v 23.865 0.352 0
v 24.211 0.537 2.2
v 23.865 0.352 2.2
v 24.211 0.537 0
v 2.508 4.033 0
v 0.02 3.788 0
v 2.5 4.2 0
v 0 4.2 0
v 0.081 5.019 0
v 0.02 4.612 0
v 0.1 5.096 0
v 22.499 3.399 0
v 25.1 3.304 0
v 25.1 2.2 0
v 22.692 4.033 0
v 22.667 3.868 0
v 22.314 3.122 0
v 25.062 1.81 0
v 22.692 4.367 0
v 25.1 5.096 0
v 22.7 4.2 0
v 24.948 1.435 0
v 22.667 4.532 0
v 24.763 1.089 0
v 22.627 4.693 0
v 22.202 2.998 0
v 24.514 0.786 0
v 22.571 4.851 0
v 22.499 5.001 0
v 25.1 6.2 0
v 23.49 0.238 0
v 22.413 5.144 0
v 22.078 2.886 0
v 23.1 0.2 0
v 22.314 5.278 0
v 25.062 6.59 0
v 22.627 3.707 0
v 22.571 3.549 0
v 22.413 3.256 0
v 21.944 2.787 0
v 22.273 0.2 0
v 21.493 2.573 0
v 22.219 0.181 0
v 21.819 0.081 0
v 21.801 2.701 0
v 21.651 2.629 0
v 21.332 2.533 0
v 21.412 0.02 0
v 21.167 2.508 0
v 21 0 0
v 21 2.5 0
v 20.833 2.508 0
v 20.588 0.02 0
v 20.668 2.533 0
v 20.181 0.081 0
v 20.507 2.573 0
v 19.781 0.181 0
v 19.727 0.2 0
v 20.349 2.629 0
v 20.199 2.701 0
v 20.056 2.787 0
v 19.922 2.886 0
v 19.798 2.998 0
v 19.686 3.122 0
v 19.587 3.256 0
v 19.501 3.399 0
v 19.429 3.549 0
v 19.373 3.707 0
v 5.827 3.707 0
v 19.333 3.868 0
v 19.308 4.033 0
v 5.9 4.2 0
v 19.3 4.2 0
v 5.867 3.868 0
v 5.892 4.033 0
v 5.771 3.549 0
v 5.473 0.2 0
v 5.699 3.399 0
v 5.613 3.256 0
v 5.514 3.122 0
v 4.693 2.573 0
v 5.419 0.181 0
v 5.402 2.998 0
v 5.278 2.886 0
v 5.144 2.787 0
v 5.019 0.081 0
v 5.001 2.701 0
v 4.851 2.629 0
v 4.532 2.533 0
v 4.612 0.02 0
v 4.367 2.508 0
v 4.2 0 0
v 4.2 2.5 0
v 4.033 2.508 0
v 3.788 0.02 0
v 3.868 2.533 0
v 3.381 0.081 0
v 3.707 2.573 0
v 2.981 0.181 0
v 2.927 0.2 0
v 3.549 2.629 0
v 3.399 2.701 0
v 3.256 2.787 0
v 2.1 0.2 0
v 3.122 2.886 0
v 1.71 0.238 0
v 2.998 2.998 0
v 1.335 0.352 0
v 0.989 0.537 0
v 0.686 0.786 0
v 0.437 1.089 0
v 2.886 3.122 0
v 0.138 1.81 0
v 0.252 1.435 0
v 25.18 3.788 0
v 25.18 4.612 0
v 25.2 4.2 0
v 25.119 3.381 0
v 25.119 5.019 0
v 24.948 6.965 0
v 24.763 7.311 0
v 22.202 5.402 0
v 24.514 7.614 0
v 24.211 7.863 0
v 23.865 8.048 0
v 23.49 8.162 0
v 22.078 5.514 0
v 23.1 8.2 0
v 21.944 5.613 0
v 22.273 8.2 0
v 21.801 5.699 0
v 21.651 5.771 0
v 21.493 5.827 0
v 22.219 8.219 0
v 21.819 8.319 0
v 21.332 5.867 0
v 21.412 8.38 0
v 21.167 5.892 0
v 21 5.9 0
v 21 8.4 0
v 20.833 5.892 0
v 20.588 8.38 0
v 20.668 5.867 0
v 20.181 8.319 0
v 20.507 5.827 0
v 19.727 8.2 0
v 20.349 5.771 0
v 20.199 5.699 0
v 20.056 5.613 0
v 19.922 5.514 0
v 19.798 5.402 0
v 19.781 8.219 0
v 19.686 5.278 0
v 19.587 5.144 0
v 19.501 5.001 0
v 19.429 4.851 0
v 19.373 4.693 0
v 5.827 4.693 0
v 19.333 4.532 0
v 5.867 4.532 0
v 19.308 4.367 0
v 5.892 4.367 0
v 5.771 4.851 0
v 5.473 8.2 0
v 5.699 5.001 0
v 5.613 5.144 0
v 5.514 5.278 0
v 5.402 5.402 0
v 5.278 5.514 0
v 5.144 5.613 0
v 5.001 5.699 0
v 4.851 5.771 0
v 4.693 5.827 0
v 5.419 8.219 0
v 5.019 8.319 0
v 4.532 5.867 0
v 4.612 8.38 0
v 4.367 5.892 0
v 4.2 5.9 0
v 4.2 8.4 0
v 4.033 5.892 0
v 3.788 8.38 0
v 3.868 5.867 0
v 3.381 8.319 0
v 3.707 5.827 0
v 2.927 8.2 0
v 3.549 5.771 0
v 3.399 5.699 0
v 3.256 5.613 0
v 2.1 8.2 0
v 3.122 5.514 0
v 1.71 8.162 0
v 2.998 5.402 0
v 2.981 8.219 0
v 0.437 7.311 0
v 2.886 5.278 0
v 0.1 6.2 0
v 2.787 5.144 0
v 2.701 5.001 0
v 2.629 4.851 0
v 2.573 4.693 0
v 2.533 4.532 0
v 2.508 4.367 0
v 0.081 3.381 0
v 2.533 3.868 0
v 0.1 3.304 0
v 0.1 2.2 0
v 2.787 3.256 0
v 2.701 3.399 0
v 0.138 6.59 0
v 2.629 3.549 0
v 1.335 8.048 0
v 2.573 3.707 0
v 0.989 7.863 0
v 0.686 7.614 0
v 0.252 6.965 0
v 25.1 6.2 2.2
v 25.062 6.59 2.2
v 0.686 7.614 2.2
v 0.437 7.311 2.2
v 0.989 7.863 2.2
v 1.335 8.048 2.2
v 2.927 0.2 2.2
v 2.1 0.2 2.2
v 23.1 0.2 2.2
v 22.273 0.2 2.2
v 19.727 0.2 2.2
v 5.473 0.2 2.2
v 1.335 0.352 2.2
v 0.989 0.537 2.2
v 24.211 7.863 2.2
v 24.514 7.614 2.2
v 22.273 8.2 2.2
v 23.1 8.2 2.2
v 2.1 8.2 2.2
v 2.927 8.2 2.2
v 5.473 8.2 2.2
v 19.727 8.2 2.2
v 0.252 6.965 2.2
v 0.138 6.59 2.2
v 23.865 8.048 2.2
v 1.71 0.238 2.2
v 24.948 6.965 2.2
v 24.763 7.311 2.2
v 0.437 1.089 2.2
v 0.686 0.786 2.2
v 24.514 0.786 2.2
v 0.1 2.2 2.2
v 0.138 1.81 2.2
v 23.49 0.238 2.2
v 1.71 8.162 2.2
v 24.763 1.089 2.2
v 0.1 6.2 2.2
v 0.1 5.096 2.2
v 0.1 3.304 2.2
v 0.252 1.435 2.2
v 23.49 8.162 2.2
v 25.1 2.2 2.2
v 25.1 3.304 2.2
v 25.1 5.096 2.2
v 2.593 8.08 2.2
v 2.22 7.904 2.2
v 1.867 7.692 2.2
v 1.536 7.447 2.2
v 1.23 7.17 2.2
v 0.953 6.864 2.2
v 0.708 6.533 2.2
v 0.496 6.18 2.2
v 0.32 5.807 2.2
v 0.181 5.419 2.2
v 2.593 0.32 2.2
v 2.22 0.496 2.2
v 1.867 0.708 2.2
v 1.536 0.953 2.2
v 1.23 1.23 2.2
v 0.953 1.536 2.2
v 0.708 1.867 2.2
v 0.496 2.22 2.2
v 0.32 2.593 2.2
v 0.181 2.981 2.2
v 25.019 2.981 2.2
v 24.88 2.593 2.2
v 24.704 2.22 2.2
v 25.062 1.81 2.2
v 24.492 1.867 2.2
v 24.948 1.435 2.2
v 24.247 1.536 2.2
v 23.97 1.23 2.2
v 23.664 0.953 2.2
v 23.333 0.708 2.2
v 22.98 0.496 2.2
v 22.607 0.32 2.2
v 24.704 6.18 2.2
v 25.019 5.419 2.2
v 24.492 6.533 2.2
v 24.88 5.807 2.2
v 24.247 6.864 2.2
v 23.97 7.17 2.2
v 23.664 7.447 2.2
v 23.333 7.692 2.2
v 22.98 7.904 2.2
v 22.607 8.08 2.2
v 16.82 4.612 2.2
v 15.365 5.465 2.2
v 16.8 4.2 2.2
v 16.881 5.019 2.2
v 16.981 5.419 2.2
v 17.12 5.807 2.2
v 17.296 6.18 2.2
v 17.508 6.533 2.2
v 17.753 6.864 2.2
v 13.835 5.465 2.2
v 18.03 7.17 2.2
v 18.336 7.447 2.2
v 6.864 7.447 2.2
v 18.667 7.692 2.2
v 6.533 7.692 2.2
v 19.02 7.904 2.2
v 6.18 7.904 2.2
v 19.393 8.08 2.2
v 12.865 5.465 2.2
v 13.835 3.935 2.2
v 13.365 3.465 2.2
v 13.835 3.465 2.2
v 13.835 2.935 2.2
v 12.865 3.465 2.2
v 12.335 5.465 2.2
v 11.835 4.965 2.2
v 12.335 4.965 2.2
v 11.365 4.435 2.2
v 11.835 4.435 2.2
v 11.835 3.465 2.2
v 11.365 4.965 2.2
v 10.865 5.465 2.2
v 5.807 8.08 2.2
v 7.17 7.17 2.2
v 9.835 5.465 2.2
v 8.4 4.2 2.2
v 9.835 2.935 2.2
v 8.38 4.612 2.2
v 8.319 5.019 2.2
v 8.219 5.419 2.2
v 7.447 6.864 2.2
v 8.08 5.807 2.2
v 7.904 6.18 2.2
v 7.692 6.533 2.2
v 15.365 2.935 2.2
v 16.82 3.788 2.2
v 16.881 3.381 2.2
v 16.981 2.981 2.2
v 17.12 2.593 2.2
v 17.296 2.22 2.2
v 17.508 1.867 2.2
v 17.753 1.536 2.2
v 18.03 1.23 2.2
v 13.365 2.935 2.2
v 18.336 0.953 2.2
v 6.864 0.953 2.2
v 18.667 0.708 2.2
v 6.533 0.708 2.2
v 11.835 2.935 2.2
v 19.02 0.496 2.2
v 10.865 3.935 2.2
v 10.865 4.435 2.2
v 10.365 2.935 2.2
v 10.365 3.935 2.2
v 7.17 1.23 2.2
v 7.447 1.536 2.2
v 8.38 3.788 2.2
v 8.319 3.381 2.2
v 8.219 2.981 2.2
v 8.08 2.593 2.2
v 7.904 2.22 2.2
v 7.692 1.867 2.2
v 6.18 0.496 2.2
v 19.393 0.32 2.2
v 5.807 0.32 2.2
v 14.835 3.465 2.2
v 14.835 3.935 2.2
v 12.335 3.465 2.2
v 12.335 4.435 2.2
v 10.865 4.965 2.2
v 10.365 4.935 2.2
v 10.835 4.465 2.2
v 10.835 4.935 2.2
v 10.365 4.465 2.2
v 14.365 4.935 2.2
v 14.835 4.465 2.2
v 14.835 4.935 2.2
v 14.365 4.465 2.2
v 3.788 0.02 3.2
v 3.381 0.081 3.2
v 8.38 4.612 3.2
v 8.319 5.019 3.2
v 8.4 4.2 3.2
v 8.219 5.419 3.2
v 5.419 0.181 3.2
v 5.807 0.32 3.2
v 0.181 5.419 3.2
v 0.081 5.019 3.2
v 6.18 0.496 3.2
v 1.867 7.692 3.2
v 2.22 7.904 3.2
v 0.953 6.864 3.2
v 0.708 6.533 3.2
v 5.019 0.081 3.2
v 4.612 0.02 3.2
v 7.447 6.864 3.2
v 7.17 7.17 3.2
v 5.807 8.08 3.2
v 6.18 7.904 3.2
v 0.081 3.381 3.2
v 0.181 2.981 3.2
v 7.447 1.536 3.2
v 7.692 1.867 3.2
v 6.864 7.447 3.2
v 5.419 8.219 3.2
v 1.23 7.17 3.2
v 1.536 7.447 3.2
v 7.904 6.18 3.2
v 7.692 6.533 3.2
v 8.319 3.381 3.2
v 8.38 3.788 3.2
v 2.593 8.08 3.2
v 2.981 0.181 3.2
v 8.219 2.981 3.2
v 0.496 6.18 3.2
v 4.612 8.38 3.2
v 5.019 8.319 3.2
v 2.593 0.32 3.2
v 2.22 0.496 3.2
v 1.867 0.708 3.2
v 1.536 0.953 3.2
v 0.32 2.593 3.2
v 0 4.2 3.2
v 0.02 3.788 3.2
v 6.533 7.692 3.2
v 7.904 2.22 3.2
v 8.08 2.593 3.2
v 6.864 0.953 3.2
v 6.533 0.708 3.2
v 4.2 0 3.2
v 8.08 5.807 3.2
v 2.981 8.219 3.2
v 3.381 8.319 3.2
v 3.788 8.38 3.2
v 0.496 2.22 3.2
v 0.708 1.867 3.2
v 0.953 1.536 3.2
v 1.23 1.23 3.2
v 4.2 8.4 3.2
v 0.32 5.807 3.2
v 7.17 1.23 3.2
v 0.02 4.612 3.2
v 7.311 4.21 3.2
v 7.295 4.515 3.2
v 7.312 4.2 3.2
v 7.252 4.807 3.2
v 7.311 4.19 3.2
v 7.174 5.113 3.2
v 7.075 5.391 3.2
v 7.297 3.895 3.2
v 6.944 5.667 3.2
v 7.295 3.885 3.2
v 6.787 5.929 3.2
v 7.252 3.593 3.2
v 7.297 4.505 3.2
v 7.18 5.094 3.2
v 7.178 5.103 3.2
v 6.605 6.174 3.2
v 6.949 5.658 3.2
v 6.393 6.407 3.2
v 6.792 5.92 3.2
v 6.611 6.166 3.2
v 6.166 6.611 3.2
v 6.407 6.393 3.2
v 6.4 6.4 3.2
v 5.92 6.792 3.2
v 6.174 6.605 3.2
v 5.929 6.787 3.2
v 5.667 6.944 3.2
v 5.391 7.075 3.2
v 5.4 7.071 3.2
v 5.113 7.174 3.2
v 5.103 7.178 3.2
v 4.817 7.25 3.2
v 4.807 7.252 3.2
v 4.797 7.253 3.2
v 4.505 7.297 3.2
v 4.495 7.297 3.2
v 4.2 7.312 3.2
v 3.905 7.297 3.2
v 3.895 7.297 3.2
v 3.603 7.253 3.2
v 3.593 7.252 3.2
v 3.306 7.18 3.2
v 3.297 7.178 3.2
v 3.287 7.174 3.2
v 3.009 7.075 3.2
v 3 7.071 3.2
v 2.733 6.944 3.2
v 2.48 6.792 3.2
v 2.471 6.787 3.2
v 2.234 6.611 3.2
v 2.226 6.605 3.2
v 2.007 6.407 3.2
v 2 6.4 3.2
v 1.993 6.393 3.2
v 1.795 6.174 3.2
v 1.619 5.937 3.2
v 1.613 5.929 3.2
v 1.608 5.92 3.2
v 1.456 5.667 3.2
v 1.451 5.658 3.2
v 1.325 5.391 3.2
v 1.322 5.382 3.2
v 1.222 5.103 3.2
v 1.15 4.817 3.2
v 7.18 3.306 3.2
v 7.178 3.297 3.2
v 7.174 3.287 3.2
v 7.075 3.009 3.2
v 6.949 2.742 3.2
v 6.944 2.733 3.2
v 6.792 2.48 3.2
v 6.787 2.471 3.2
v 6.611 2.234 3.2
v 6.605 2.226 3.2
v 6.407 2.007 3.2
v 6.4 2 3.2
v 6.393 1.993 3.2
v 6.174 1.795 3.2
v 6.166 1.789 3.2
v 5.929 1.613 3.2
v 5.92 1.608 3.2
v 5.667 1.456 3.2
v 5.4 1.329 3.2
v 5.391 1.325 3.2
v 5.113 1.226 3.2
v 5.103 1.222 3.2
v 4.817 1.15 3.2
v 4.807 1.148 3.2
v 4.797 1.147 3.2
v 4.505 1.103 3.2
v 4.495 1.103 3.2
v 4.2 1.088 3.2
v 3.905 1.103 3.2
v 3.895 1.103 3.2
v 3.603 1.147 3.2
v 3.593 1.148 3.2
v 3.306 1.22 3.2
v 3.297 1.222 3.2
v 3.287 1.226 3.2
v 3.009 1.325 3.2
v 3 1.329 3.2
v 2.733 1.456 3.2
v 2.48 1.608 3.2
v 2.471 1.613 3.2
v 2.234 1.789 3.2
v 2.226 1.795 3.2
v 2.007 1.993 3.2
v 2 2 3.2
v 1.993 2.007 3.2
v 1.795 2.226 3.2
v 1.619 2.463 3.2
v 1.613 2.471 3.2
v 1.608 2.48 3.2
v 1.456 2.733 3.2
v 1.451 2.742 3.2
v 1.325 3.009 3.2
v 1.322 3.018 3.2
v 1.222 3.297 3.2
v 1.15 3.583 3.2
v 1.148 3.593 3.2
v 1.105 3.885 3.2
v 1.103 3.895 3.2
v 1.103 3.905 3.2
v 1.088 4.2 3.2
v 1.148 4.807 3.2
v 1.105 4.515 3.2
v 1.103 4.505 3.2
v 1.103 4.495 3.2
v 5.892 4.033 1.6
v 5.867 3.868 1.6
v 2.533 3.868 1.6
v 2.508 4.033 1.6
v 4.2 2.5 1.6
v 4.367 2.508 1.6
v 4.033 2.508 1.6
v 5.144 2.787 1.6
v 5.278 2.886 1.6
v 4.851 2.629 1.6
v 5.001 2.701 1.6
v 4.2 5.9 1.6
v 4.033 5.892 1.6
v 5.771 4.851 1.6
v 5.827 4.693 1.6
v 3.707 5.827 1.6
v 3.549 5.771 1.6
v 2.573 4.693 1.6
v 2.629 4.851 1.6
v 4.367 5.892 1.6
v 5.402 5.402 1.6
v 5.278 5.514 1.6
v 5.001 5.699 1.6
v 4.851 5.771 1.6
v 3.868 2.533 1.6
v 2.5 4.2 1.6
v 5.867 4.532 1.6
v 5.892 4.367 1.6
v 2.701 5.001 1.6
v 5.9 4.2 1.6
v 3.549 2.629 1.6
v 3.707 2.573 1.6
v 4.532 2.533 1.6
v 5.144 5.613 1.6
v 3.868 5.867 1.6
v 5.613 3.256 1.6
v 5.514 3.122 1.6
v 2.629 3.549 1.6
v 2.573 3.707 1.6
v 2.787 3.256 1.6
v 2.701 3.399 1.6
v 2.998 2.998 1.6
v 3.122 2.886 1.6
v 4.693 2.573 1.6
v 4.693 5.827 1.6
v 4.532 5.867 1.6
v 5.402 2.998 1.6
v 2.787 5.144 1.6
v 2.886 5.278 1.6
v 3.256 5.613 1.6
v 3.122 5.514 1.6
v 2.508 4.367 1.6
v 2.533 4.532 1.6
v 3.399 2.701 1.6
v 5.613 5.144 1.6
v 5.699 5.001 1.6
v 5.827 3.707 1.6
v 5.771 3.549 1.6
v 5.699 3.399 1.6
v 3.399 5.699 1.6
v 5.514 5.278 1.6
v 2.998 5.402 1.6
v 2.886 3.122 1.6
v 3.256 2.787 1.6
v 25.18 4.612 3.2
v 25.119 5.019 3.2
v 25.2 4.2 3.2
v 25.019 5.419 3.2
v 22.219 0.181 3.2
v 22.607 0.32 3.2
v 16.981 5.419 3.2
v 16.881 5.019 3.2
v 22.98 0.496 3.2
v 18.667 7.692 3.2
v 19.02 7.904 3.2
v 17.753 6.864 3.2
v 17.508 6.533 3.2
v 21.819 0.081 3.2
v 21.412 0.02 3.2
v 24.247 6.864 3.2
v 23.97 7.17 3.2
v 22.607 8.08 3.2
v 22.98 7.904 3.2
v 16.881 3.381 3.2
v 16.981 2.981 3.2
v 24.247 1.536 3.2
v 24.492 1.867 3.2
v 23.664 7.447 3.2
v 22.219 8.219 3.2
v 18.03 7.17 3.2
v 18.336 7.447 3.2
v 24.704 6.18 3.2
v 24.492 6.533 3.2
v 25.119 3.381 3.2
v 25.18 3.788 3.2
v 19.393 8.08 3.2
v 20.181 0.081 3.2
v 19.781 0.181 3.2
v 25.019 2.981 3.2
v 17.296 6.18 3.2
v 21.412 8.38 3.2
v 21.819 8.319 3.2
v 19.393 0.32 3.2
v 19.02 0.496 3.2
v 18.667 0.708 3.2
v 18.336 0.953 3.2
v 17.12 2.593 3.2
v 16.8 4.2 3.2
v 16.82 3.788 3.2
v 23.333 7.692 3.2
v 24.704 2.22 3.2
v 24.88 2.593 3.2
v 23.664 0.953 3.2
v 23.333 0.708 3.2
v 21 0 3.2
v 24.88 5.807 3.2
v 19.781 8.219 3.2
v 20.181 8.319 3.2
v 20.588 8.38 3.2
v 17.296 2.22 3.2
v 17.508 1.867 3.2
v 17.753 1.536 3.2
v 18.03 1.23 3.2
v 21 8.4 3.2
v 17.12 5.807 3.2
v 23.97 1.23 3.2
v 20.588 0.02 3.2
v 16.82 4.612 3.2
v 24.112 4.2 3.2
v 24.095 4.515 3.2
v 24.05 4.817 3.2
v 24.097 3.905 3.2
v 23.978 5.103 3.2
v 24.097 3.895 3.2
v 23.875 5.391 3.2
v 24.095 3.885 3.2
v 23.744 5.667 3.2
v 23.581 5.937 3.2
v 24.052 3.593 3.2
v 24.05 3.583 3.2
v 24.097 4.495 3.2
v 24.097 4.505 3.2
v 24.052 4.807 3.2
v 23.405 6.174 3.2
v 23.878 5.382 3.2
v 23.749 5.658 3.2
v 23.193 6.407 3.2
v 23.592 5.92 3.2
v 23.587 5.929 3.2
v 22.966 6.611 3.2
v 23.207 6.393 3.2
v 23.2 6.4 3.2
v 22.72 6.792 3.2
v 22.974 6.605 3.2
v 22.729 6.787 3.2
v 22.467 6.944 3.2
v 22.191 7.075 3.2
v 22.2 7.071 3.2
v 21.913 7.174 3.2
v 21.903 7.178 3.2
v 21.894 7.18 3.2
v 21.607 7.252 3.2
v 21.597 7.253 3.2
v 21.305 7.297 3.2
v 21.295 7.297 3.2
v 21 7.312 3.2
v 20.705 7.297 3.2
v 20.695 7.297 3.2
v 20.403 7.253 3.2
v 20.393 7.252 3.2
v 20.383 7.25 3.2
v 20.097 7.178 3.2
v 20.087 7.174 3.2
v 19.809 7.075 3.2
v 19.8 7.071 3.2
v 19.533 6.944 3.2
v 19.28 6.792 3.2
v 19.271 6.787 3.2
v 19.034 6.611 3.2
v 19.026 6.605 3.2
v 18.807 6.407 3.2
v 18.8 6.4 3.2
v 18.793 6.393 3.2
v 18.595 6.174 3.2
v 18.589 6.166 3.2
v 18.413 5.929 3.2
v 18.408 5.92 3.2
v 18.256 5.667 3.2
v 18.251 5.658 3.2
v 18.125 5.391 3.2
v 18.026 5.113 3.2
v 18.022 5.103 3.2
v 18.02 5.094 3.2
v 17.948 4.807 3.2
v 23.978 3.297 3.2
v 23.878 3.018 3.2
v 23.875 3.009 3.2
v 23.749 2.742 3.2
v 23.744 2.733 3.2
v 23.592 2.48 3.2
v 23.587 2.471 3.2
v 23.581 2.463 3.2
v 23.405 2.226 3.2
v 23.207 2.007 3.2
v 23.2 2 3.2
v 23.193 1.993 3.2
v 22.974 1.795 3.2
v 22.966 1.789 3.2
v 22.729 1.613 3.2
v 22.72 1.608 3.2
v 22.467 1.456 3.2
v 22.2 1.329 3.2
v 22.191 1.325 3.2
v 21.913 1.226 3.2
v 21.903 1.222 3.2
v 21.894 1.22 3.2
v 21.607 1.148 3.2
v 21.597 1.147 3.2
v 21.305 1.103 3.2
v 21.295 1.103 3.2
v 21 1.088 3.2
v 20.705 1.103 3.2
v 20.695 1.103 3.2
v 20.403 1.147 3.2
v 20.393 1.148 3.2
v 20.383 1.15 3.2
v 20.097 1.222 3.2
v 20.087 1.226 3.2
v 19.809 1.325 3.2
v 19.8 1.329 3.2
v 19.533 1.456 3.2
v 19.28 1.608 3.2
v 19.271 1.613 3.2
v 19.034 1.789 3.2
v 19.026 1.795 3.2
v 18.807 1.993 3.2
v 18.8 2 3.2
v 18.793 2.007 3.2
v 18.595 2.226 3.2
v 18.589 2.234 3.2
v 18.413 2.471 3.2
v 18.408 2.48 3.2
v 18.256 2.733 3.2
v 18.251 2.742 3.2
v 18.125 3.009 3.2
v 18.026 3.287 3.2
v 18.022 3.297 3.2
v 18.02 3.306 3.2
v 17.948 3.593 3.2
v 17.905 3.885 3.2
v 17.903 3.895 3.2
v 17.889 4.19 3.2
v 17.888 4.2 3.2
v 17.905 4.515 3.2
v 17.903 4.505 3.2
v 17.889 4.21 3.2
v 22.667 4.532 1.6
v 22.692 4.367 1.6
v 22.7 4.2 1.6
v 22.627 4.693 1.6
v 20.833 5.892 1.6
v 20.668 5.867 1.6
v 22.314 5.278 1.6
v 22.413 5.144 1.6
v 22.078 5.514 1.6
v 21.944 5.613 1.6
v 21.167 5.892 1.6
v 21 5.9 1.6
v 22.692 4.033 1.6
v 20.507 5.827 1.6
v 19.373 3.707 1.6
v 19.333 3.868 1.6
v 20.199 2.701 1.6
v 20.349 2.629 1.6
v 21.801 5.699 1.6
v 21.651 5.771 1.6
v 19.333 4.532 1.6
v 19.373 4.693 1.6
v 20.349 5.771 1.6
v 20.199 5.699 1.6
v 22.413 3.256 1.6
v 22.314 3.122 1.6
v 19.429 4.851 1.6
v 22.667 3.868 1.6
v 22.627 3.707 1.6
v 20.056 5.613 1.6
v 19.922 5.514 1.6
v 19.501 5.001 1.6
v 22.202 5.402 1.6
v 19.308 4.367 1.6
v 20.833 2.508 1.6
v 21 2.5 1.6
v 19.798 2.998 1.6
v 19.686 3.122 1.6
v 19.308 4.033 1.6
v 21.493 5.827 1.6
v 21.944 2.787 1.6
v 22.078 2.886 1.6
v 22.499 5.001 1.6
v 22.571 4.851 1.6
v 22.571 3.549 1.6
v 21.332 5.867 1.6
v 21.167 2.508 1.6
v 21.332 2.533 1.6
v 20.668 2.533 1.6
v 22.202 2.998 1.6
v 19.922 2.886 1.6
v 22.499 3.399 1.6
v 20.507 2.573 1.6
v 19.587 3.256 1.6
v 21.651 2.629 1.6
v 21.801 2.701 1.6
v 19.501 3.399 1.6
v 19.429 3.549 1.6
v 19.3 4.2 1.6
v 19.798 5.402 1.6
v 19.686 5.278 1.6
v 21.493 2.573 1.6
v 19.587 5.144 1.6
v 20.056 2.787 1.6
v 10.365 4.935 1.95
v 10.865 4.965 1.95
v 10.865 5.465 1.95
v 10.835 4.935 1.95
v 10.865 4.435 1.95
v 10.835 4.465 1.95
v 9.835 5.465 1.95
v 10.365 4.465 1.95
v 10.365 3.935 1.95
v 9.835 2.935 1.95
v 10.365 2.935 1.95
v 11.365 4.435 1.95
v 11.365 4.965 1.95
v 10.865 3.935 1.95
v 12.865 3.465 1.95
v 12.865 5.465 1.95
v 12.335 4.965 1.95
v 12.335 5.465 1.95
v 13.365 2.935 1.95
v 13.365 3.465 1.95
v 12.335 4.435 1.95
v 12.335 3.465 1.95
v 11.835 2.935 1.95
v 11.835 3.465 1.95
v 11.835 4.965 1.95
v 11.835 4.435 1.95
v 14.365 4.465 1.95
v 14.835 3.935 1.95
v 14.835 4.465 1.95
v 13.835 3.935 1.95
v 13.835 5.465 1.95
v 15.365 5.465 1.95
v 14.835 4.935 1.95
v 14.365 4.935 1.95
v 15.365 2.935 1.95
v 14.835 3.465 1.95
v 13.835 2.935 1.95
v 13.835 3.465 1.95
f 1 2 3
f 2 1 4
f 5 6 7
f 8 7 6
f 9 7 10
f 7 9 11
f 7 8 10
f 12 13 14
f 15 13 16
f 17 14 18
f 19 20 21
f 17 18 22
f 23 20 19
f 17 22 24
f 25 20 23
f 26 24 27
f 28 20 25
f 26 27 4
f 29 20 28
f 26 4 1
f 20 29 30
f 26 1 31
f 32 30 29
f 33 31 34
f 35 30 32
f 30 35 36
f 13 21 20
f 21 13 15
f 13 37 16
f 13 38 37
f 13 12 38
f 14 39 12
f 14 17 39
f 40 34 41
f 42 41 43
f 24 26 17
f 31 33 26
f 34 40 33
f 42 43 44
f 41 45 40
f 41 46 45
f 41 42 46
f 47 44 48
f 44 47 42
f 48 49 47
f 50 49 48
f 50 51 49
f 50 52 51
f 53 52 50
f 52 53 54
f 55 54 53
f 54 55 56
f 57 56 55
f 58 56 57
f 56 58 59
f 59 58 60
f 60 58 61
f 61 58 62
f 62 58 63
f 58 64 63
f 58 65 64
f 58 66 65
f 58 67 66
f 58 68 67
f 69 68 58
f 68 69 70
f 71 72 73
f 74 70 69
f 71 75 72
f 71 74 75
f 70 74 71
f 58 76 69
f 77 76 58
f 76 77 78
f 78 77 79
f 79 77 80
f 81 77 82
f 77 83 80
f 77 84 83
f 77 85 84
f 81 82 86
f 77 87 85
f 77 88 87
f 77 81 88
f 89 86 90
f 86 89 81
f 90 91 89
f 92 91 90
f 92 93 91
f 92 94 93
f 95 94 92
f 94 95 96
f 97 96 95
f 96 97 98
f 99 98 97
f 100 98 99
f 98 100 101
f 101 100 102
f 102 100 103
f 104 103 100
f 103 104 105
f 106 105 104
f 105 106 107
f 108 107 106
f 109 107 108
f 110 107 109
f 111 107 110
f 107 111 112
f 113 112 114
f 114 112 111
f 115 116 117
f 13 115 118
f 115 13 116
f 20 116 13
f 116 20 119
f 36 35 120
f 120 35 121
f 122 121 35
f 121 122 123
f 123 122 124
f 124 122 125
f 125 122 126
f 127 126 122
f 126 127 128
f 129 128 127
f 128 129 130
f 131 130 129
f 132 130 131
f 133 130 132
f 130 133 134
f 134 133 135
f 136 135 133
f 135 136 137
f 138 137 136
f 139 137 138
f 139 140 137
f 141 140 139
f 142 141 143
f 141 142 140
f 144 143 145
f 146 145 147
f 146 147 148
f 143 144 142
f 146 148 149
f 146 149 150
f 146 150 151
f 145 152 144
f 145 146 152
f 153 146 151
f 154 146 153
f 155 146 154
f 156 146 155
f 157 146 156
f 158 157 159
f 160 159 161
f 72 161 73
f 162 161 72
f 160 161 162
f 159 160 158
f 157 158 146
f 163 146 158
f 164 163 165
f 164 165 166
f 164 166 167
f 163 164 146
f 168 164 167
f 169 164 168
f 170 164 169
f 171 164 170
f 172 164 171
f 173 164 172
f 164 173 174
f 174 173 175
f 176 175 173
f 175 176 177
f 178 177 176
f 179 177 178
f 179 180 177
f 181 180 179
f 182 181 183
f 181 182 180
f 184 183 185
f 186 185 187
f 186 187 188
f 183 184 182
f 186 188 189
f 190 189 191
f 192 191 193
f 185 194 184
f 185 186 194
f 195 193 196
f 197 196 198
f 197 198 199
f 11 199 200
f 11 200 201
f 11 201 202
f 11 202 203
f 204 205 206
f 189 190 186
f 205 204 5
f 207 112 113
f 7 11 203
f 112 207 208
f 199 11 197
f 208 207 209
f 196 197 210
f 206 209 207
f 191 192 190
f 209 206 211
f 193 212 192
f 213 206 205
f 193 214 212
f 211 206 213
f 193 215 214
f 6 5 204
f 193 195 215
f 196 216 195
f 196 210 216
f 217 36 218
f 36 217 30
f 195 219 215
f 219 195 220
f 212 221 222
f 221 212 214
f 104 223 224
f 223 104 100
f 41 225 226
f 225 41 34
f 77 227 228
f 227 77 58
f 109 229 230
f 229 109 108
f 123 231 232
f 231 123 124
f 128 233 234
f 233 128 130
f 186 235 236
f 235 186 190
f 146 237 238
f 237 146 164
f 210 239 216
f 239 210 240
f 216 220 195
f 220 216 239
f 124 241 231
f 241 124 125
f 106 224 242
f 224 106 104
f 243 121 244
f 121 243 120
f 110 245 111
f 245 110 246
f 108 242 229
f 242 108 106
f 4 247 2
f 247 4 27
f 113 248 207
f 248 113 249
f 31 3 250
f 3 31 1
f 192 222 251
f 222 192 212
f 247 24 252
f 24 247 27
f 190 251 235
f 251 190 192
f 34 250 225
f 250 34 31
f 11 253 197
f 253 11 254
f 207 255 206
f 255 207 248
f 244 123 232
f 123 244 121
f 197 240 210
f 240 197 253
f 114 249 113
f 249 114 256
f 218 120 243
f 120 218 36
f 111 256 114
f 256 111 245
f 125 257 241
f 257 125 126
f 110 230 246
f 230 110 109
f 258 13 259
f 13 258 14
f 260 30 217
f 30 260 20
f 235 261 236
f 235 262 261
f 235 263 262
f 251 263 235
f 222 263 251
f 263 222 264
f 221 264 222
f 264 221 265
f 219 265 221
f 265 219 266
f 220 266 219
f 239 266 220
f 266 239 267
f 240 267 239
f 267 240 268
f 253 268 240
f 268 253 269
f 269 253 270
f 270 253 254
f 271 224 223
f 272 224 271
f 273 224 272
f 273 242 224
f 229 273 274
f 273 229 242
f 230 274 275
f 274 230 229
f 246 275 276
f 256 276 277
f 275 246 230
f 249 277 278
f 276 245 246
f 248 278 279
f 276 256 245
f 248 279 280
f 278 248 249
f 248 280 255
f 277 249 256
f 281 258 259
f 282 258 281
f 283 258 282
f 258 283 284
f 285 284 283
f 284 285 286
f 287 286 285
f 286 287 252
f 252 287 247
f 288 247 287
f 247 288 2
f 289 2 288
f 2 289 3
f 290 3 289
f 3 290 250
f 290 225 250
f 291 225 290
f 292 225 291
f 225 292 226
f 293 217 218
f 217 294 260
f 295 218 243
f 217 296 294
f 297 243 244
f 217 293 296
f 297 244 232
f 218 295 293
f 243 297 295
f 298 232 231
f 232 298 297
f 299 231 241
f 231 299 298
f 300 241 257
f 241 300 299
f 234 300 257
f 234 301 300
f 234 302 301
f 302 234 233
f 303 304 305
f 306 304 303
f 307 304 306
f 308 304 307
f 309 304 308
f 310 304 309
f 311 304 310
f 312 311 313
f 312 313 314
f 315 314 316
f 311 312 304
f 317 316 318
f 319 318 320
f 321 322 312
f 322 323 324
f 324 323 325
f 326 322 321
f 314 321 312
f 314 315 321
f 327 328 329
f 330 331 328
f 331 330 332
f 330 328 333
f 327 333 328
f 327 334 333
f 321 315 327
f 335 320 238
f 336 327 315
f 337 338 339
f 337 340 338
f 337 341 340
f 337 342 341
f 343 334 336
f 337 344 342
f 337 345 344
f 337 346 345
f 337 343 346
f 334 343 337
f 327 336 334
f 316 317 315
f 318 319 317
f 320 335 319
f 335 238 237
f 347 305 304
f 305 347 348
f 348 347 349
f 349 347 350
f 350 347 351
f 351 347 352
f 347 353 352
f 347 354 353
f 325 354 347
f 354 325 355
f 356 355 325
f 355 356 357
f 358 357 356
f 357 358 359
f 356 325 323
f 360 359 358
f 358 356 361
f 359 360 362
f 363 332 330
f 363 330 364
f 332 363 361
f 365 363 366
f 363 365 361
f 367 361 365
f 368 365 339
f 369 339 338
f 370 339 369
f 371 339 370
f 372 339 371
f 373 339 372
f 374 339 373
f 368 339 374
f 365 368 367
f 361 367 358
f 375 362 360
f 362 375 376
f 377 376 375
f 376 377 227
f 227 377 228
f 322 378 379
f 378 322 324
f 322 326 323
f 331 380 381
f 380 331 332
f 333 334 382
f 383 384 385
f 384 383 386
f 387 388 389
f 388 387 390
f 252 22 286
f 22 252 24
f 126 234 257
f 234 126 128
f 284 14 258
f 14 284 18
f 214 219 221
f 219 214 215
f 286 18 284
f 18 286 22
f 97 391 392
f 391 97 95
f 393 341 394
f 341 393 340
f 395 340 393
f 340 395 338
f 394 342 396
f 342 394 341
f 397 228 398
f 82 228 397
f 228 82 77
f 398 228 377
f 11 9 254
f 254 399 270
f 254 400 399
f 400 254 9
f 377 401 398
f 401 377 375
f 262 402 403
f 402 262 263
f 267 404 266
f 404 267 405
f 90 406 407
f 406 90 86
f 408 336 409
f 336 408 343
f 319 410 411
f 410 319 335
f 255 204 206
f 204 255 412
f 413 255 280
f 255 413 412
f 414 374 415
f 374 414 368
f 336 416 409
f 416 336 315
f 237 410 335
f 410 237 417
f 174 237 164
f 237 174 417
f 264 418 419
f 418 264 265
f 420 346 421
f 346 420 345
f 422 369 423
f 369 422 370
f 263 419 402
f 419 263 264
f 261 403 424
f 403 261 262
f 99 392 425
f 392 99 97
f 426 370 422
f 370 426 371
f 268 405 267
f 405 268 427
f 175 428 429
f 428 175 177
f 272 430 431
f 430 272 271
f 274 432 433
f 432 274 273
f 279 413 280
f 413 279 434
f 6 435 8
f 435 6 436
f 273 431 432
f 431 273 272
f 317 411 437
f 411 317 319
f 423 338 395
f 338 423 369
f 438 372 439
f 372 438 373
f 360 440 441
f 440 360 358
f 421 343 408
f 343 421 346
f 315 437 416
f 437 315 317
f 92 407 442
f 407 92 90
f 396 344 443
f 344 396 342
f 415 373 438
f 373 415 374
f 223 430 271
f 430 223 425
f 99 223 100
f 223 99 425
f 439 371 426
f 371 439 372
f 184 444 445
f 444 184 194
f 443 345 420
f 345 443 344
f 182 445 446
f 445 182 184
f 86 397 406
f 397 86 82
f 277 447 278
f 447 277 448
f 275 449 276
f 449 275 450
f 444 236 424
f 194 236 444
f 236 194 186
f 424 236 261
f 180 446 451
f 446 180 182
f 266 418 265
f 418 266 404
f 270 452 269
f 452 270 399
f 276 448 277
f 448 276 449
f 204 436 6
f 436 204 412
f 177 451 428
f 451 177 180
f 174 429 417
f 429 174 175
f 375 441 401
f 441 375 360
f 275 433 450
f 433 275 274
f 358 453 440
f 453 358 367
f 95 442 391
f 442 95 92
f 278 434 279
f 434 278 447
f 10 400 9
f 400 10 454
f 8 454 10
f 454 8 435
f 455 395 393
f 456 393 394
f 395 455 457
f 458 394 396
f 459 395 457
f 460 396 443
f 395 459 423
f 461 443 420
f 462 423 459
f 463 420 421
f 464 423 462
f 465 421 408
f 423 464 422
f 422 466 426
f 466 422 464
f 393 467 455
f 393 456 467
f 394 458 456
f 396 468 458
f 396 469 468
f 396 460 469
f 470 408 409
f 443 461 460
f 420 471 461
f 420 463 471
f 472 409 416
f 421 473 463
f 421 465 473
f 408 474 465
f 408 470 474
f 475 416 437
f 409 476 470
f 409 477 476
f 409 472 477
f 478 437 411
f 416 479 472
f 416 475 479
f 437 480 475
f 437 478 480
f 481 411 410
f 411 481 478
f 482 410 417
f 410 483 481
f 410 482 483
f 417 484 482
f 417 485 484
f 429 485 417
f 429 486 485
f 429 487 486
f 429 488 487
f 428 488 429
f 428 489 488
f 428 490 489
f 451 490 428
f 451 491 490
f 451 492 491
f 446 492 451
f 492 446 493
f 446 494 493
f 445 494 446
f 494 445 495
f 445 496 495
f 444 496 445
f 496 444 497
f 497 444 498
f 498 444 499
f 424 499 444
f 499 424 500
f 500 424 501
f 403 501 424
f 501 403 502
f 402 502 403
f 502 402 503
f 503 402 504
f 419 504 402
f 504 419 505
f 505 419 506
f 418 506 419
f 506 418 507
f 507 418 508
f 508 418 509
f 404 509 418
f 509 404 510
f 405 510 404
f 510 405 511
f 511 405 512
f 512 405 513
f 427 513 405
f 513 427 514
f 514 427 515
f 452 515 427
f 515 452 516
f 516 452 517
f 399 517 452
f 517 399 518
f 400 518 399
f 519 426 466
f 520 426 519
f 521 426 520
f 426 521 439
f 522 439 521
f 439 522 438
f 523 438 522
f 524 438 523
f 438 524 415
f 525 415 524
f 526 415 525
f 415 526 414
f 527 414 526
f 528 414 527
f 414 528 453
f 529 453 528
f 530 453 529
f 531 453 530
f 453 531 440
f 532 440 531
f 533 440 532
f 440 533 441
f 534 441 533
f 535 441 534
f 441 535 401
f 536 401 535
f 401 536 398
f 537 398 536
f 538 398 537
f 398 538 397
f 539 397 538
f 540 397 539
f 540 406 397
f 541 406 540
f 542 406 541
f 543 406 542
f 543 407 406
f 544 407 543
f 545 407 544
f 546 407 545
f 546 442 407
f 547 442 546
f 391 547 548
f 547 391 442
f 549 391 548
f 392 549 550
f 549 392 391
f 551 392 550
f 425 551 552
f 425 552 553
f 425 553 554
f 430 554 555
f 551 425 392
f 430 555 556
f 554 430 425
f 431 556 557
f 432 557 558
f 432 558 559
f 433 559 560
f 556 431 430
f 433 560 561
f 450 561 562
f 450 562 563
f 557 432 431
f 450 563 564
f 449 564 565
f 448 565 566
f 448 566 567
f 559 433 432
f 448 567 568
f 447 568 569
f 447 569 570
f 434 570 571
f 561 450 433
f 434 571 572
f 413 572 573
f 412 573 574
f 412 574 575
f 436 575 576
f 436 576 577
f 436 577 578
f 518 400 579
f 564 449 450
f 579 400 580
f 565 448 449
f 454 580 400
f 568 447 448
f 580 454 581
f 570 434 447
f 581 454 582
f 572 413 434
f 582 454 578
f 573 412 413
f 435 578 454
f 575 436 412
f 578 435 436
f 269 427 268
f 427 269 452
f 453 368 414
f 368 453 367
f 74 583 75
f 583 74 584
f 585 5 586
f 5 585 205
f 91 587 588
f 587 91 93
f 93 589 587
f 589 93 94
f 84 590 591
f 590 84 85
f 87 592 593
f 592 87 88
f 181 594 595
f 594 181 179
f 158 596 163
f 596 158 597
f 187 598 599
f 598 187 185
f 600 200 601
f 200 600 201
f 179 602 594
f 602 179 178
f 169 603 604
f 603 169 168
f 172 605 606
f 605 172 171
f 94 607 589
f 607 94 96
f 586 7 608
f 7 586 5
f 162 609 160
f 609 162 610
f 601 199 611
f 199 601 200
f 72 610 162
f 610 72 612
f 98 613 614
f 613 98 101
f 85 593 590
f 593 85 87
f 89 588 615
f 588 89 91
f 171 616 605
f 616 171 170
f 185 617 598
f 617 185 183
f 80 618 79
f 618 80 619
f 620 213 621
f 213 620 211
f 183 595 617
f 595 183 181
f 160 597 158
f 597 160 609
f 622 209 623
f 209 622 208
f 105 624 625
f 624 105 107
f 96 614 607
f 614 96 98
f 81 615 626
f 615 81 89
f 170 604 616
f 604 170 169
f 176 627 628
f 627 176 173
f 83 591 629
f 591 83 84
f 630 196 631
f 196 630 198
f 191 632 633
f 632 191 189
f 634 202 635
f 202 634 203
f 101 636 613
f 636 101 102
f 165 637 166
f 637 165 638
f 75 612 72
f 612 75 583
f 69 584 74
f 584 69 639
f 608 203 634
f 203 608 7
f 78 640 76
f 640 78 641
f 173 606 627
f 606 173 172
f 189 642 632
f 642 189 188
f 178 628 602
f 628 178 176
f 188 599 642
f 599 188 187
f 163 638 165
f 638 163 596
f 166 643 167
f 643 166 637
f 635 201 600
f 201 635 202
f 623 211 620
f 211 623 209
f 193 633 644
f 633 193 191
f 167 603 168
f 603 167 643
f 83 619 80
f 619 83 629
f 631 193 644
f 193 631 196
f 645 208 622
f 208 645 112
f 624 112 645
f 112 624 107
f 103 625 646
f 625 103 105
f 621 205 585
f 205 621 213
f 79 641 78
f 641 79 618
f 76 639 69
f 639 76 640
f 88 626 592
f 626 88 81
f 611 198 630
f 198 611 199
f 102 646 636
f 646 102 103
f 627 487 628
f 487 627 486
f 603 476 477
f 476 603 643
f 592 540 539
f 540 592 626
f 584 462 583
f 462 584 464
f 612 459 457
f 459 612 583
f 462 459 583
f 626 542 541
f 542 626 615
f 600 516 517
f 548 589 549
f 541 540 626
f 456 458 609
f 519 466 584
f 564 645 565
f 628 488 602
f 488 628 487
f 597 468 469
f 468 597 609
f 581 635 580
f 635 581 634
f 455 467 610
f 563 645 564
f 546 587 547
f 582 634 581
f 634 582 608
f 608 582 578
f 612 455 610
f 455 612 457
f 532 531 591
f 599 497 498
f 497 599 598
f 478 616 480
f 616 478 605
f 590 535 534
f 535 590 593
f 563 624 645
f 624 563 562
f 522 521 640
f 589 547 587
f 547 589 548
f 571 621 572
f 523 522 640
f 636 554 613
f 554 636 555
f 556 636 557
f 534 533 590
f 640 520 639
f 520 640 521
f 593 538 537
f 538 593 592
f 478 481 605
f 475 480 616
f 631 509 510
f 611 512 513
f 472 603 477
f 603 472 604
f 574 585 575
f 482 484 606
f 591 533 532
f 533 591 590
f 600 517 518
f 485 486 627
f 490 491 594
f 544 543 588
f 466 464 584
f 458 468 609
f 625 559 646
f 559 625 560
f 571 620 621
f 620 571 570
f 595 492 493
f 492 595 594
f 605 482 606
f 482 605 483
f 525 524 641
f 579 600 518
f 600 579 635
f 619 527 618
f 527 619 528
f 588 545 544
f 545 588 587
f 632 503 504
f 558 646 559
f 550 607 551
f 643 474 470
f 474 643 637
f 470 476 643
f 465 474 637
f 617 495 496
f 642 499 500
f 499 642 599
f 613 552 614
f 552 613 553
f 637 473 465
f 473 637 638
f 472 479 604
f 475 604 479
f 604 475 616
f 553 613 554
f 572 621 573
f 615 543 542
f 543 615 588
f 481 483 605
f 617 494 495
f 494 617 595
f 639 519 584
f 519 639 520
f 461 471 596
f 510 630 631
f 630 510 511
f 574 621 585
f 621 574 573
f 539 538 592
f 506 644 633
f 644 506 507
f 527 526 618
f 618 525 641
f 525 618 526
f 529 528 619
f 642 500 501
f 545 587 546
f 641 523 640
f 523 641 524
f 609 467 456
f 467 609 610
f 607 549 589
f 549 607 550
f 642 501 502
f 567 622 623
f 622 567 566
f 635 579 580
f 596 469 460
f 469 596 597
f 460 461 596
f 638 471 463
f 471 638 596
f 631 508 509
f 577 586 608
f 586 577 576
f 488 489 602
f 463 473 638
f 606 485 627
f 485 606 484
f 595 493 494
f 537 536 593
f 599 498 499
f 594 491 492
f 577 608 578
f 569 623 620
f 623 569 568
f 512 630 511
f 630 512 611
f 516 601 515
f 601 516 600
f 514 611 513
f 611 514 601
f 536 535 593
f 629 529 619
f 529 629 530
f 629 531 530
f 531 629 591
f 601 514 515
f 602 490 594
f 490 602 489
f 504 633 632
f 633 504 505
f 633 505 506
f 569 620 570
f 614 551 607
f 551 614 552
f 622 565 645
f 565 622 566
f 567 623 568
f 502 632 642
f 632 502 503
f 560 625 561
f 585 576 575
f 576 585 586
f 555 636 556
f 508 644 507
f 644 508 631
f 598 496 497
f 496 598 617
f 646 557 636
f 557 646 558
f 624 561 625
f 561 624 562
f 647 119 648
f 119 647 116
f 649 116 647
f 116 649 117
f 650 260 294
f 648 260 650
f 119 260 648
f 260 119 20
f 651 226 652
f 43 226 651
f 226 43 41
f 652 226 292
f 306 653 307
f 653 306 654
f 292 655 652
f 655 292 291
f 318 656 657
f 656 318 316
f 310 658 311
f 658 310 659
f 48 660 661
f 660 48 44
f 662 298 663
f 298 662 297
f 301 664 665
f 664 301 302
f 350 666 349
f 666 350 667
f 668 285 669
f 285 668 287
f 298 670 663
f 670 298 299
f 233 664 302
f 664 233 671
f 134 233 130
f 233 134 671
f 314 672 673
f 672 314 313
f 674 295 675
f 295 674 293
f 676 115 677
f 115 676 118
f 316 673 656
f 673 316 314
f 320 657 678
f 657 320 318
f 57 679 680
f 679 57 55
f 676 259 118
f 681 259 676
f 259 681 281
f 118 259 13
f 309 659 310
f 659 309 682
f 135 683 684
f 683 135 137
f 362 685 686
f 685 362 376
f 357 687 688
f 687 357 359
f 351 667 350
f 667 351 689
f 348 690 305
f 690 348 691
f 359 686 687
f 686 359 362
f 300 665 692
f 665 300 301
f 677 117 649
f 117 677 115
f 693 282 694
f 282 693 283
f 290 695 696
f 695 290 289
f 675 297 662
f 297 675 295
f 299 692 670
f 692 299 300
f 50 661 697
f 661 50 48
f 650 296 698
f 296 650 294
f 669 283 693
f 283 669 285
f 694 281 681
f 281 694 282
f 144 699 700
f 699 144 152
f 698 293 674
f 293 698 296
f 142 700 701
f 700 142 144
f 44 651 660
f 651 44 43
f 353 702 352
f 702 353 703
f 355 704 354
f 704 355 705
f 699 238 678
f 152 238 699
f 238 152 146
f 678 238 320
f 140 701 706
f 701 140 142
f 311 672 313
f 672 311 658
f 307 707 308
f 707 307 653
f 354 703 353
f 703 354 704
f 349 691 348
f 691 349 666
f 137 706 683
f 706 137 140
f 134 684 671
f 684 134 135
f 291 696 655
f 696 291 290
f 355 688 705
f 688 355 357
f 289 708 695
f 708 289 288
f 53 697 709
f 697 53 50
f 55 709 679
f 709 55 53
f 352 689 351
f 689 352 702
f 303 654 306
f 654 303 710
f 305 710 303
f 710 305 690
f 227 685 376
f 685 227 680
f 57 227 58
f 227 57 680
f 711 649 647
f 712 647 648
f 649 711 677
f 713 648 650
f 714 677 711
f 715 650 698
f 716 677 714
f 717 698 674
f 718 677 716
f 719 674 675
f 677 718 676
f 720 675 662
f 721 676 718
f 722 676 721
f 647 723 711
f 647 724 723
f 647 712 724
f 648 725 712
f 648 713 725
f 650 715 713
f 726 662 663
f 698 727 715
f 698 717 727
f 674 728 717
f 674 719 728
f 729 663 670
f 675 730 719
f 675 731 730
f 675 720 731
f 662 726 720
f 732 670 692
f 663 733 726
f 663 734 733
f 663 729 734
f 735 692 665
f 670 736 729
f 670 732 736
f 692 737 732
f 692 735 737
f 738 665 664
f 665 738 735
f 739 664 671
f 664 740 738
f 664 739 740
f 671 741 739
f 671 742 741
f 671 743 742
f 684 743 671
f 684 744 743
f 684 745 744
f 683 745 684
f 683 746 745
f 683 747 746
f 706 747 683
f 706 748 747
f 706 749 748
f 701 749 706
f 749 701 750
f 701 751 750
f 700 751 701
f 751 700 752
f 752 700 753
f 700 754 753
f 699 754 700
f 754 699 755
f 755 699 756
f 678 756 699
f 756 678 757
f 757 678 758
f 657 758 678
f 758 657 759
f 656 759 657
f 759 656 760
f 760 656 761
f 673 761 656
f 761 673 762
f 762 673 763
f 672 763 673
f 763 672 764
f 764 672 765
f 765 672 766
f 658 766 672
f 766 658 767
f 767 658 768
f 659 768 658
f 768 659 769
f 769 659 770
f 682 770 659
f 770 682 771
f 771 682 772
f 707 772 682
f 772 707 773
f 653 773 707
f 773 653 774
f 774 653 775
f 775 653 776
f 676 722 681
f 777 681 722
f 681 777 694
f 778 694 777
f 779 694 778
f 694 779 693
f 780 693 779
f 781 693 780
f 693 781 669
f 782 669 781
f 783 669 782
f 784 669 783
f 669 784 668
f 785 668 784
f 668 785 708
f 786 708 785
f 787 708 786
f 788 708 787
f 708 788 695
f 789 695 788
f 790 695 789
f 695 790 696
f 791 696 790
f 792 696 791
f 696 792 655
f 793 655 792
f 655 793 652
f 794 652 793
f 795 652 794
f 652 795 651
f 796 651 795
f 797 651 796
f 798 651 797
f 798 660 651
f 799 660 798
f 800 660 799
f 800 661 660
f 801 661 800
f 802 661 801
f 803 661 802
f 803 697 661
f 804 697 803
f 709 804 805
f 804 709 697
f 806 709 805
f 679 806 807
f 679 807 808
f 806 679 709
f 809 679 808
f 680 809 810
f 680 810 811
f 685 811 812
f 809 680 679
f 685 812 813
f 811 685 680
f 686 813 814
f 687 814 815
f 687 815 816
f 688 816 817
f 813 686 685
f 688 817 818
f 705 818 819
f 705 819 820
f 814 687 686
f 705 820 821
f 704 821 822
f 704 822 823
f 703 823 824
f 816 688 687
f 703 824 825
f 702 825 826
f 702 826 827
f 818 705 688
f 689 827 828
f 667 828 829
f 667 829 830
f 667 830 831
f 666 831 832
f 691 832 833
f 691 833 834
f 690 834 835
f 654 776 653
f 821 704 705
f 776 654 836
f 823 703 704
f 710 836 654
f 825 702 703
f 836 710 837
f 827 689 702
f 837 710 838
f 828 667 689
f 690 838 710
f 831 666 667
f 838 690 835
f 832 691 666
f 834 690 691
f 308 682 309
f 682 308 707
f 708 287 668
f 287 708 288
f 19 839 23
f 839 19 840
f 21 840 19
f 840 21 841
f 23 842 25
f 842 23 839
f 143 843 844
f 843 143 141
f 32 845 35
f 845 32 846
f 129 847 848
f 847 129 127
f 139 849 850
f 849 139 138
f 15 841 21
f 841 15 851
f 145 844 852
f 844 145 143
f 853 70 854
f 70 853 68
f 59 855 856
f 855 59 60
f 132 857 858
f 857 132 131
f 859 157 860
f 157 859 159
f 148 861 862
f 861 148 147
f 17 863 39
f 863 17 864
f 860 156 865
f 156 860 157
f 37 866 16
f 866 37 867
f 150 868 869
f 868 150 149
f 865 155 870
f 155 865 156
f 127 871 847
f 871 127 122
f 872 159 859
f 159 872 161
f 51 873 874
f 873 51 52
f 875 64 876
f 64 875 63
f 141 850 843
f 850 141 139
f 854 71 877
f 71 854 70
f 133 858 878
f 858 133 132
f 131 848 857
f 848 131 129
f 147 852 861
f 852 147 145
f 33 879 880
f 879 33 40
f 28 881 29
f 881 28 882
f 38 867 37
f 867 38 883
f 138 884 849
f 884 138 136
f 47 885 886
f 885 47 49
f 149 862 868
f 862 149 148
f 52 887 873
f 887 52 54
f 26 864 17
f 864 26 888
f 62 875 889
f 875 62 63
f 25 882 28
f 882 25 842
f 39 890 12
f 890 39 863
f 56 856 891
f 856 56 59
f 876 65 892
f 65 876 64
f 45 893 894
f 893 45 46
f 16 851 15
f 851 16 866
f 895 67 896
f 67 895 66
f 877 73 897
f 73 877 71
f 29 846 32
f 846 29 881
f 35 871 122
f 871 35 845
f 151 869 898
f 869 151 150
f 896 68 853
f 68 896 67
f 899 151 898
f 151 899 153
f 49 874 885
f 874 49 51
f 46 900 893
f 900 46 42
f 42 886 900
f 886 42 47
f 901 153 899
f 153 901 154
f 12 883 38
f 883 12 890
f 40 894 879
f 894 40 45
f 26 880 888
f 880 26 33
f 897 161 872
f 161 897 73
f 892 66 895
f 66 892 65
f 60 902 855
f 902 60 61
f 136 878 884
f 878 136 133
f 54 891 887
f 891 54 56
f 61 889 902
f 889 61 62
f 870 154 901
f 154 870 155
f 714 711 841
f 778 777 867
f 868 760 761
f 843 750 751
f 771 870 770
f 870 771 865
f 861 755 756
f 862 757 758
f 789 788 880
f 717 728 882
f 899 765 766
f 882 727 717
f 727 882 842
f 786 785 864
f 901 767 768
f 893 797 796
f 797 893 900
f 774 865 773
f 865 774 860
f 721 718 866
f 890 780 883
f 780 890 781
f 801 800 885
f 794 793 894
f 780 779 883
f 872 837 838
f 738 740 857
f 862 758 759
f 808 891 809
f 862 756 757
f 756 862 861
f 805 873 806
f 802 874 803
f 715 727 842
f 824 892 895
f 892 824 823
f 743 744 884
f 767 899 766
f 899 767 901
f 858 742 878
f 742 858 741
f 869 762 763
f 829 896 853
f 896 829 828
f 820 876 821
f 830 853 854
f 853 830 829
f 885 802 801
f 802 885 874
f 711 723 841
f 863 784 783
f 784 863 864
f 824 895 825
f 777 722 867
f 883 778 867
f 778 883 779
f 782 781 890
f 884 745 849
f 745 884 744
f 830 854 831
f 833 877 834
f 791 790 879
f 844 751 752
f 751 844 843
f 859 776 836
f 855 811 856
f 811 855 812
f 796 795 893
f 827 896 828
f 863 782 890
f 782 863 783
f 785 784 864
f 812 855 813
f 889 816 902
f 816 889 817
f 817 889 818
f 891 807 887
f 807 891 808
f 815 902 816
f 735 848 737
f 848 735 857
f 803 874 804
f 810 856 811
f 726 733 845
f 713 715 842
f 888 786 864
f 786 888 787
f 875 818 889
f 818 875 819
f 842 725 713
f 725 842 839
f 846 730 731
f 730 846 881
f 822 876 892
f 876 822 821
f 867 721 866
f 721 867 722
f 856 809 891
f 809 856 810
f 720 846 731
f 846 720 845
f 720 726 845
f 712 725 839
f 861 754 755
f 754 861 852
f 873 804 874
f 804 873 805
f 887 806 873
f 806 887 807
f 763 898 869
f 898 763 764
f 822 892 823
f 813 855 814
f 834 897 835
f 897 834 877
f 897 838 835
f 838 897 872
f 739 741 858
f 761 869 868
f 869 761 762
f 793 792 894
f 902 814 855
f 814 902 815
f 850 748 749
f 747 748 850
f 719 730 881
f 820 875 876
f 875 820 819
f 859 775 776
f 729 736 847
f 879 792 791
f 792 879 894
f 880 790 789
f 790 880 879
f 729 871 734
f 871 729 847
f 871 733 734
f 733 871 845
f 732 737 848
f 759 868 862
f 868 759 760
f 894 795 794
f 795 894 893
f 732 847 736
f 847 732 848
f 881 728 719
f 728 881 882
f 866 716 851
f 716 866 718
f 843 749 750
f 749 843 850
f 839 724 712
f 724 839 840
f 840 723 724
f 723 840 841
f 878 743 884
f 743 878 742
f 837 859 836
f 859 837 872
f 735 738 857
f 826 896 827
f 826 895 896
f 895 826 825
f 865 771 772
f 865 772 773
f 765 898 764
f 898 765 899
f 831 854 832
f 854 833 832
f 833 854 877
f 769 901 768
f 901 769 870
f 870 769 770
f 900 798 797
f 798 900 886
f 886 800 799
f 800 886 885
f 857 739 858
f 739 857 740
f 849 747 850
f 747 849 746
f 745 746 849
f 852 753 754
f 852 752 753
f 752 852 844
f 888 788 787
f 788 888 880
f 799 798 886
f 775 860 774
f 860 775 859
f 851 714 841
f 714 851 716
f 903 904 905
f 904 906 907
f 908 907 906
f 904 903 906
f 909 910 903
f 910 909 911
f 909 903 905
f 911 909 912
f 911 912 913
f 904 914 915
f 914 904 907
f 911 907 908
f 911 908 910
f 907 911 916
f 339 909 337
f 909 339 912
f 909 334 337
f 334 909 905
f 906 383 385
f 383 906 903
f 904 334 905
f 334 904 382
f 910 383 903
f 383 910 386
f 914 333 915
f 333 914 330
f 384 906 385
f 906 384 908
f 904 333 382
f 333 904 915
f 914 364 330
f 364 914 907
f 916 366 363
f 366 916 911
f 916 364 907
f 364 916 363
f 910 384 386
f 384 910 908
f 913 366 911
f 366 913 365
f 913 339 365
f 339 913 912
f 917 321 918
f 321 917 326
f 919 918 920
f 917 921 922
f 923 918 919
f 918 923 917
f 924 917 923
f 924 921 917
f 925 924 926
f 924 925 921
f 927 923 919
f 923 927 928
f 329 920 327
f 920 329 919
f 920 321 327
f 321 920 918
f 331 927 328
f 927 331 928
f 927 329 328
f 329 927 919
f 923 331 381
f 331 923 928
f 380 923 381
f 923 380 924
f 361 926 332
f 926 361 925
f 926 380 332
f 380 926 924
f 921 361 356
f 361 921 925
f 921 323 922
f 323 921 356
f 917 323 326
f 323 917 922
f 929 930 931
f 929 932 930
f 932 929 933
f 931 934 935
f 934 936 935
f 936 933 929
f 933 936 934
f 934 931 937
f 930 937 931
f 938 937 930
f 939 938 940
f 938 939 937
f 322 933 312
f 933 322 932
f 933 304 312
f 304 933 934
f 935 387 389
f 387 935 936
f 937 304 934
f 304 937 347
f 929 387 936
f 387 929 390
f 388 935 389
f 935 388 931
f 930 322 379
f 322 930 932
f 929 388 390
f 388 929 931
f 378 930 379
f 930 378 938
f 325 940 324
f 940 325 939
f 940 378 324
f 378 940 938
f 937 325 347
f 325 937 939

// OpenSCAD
// N20馬達壓片
$fn=64;
translate([34.6,15.2,-59]){rotate([0,0,0]){difference(){difference(){difference(){union(){difference(){difference(){union(){translate([-22,-11,0]){translate([0,0,59]){linear_extrude(height=2.2)polygon([[12.5,2],[12.46157,2.39018],[12.34776,2.76537],[12.16294,3.11114],[11.91421,3.41421],[11.61114,3.66294],[11.26537,3.84776],[10.89018,3.96157],[10.5,4],[-10.5,4],[-10.89018,3.96157],[-11.26537,3.84776],[-11.61114,3.66294],[-11.91421,3.41421],[-12.16294,3.11114],[-12.34776,2.76537],[-12.46157,2.39018],[-12.5,2],[-12.5,-2],[-12.46157,-2.39018],[-12.34776,-2.76537],[-12.16294,-3.11114],[-11.91421,-3.41421],[-11.61114,-3.66294],[-11.26537,-3.84776],[-10.89018,-3.96157],[-10.5,-4],[10.5,-4],[10.89018,-3.96157],[11.26537,-3.84776],[11.61114,-3.66294],[11.91421,-3.41421],[12.16294,-3.11114],[12.34776,-2.76537],[12.46157,-2.39018],[12.5,-2]]);}}translate([-30.4,-11,59]){cylinder(h=3.2,d1=8.4,d2=8.4,$fn=64);}}translate([-30.4,-11,58]){cylinder(h=6,d1=3.4,d2=3.4,$fn=64);}}translate([-30.4,-11,62.3]){rotate([180,0,0]){translate([0,0,0]){cylinder(h=1.7,d1=6.4,d2=3.4,$fn=64);}}}}translate([-13.6,-11,59]){cylinder(h=3.2,d1=8.4,d2=8.4,$fn=64);}}translate([-13.6,-11,58]){cylinder(h=6,d1=3.4,d2=3.4,$fn=64);}}translate([-13.6,-11,62.3]){rotate([180,0,0]){translate([0,0,0]){cylinder(h=1.7,d1=6.4,d2=3.4,$fn=64);}}}}multmatrix([[1,0,0,-22],[0,1,0,-11],[0,0,1,61.2],[0,0,0,1]]){union(){union(){union(){union(){union(){union(){union(){union(){union(){union(){union(){union(){union(){union(){union(){union(){union(){union(){union(){union(){union(){union(){union(){union(){union(){union(){union(){translate([-2.765,0.735,-0.25]){cube([0.53,0.53,0.37]);}translate([-2.265,0.735,-0.25]){cube([0.53,0.53,0.37]);}}translate([-2.765,0.235,-0.25]){cube([0.53,0.53,0.37]);}}translate([-1.765,0.235,-0.25]){cube([0.53,0.53,0.37]);}}translate([-2.765,-0.265,-0.25]){cube([0.53,0.53,0.37]);}}translate([-2.265,-0.265,-0.25]){cube([0.53,0.53,0.37]);}}translate([-2.765,-0.765,-0.25]){cube([0.53,0.53,0.37]);}}translate([-2.765,-1.265,-0.25]){cube([0.53,0.53,0.37]);}}translate([-0.265,0.735,-0.25]){cube([0.53,0.53,0.37]);}}translate([-0.765,0.235,-0.25]){cube([0.53,0.53,0.37]);}}translate([-0.265,0.235,-0.25]){cube([0.53,0.53,0.37]);}}translate([-0.265,-0.265,-0.25]){cube([0.53,0.53,0.37]);}}translate([-0.265,-0.765,-0.25]){cube([0.53,0.53,0.37]);}}translate([-0.765,-1.265,-0.25]){cube([0.53,0.53,0.37]);}}translate([-0.265,-1.265,-0.25]){cube([0.53,0.53,0.37]);}}translate([0.235,-1.265,-0.25]){cube([0.53,0.53,0.37]);}}translate([1.235,0.735,-0.25]){cube([0.53,0.53,0.37]);}}translate([1.735,0.735,-0.25]){cube([0.53,0.53,0.37]);}}translate([2.235,0.735,-0.25]){cube([0.53,0.53,0.37]);}}translate([1.235,0.235,-0.25]){cube([0.53,0.53,0.37]);}}translate([2.235,0.235,-0.25]){cube([0.53,0.53,0.37]);}}translate([1.235,-0.265,-0.25]){cube([0.53,0.53,0.37]);}}translate([1.735,-0.265,-0.25]){cube([0.53,0.53,0.37]);}}translate([2.235,-0.265,-0.25]){cube([0.53,0.53,0.37]);}}translate([2.235,-0.765,-0.25]){cube([0.53,0.53,0.37]);}}translate([1.235,-1.265,-0.25]){cube([0.53,0.53,0.37]);}}translate([1.735,-1.265,-0.25]){cube([0.53,0.53,0.37]);}}translate([2.235,-1.265,-0.25]){cube([0.53,0.53,0.37]);}}}}}}
